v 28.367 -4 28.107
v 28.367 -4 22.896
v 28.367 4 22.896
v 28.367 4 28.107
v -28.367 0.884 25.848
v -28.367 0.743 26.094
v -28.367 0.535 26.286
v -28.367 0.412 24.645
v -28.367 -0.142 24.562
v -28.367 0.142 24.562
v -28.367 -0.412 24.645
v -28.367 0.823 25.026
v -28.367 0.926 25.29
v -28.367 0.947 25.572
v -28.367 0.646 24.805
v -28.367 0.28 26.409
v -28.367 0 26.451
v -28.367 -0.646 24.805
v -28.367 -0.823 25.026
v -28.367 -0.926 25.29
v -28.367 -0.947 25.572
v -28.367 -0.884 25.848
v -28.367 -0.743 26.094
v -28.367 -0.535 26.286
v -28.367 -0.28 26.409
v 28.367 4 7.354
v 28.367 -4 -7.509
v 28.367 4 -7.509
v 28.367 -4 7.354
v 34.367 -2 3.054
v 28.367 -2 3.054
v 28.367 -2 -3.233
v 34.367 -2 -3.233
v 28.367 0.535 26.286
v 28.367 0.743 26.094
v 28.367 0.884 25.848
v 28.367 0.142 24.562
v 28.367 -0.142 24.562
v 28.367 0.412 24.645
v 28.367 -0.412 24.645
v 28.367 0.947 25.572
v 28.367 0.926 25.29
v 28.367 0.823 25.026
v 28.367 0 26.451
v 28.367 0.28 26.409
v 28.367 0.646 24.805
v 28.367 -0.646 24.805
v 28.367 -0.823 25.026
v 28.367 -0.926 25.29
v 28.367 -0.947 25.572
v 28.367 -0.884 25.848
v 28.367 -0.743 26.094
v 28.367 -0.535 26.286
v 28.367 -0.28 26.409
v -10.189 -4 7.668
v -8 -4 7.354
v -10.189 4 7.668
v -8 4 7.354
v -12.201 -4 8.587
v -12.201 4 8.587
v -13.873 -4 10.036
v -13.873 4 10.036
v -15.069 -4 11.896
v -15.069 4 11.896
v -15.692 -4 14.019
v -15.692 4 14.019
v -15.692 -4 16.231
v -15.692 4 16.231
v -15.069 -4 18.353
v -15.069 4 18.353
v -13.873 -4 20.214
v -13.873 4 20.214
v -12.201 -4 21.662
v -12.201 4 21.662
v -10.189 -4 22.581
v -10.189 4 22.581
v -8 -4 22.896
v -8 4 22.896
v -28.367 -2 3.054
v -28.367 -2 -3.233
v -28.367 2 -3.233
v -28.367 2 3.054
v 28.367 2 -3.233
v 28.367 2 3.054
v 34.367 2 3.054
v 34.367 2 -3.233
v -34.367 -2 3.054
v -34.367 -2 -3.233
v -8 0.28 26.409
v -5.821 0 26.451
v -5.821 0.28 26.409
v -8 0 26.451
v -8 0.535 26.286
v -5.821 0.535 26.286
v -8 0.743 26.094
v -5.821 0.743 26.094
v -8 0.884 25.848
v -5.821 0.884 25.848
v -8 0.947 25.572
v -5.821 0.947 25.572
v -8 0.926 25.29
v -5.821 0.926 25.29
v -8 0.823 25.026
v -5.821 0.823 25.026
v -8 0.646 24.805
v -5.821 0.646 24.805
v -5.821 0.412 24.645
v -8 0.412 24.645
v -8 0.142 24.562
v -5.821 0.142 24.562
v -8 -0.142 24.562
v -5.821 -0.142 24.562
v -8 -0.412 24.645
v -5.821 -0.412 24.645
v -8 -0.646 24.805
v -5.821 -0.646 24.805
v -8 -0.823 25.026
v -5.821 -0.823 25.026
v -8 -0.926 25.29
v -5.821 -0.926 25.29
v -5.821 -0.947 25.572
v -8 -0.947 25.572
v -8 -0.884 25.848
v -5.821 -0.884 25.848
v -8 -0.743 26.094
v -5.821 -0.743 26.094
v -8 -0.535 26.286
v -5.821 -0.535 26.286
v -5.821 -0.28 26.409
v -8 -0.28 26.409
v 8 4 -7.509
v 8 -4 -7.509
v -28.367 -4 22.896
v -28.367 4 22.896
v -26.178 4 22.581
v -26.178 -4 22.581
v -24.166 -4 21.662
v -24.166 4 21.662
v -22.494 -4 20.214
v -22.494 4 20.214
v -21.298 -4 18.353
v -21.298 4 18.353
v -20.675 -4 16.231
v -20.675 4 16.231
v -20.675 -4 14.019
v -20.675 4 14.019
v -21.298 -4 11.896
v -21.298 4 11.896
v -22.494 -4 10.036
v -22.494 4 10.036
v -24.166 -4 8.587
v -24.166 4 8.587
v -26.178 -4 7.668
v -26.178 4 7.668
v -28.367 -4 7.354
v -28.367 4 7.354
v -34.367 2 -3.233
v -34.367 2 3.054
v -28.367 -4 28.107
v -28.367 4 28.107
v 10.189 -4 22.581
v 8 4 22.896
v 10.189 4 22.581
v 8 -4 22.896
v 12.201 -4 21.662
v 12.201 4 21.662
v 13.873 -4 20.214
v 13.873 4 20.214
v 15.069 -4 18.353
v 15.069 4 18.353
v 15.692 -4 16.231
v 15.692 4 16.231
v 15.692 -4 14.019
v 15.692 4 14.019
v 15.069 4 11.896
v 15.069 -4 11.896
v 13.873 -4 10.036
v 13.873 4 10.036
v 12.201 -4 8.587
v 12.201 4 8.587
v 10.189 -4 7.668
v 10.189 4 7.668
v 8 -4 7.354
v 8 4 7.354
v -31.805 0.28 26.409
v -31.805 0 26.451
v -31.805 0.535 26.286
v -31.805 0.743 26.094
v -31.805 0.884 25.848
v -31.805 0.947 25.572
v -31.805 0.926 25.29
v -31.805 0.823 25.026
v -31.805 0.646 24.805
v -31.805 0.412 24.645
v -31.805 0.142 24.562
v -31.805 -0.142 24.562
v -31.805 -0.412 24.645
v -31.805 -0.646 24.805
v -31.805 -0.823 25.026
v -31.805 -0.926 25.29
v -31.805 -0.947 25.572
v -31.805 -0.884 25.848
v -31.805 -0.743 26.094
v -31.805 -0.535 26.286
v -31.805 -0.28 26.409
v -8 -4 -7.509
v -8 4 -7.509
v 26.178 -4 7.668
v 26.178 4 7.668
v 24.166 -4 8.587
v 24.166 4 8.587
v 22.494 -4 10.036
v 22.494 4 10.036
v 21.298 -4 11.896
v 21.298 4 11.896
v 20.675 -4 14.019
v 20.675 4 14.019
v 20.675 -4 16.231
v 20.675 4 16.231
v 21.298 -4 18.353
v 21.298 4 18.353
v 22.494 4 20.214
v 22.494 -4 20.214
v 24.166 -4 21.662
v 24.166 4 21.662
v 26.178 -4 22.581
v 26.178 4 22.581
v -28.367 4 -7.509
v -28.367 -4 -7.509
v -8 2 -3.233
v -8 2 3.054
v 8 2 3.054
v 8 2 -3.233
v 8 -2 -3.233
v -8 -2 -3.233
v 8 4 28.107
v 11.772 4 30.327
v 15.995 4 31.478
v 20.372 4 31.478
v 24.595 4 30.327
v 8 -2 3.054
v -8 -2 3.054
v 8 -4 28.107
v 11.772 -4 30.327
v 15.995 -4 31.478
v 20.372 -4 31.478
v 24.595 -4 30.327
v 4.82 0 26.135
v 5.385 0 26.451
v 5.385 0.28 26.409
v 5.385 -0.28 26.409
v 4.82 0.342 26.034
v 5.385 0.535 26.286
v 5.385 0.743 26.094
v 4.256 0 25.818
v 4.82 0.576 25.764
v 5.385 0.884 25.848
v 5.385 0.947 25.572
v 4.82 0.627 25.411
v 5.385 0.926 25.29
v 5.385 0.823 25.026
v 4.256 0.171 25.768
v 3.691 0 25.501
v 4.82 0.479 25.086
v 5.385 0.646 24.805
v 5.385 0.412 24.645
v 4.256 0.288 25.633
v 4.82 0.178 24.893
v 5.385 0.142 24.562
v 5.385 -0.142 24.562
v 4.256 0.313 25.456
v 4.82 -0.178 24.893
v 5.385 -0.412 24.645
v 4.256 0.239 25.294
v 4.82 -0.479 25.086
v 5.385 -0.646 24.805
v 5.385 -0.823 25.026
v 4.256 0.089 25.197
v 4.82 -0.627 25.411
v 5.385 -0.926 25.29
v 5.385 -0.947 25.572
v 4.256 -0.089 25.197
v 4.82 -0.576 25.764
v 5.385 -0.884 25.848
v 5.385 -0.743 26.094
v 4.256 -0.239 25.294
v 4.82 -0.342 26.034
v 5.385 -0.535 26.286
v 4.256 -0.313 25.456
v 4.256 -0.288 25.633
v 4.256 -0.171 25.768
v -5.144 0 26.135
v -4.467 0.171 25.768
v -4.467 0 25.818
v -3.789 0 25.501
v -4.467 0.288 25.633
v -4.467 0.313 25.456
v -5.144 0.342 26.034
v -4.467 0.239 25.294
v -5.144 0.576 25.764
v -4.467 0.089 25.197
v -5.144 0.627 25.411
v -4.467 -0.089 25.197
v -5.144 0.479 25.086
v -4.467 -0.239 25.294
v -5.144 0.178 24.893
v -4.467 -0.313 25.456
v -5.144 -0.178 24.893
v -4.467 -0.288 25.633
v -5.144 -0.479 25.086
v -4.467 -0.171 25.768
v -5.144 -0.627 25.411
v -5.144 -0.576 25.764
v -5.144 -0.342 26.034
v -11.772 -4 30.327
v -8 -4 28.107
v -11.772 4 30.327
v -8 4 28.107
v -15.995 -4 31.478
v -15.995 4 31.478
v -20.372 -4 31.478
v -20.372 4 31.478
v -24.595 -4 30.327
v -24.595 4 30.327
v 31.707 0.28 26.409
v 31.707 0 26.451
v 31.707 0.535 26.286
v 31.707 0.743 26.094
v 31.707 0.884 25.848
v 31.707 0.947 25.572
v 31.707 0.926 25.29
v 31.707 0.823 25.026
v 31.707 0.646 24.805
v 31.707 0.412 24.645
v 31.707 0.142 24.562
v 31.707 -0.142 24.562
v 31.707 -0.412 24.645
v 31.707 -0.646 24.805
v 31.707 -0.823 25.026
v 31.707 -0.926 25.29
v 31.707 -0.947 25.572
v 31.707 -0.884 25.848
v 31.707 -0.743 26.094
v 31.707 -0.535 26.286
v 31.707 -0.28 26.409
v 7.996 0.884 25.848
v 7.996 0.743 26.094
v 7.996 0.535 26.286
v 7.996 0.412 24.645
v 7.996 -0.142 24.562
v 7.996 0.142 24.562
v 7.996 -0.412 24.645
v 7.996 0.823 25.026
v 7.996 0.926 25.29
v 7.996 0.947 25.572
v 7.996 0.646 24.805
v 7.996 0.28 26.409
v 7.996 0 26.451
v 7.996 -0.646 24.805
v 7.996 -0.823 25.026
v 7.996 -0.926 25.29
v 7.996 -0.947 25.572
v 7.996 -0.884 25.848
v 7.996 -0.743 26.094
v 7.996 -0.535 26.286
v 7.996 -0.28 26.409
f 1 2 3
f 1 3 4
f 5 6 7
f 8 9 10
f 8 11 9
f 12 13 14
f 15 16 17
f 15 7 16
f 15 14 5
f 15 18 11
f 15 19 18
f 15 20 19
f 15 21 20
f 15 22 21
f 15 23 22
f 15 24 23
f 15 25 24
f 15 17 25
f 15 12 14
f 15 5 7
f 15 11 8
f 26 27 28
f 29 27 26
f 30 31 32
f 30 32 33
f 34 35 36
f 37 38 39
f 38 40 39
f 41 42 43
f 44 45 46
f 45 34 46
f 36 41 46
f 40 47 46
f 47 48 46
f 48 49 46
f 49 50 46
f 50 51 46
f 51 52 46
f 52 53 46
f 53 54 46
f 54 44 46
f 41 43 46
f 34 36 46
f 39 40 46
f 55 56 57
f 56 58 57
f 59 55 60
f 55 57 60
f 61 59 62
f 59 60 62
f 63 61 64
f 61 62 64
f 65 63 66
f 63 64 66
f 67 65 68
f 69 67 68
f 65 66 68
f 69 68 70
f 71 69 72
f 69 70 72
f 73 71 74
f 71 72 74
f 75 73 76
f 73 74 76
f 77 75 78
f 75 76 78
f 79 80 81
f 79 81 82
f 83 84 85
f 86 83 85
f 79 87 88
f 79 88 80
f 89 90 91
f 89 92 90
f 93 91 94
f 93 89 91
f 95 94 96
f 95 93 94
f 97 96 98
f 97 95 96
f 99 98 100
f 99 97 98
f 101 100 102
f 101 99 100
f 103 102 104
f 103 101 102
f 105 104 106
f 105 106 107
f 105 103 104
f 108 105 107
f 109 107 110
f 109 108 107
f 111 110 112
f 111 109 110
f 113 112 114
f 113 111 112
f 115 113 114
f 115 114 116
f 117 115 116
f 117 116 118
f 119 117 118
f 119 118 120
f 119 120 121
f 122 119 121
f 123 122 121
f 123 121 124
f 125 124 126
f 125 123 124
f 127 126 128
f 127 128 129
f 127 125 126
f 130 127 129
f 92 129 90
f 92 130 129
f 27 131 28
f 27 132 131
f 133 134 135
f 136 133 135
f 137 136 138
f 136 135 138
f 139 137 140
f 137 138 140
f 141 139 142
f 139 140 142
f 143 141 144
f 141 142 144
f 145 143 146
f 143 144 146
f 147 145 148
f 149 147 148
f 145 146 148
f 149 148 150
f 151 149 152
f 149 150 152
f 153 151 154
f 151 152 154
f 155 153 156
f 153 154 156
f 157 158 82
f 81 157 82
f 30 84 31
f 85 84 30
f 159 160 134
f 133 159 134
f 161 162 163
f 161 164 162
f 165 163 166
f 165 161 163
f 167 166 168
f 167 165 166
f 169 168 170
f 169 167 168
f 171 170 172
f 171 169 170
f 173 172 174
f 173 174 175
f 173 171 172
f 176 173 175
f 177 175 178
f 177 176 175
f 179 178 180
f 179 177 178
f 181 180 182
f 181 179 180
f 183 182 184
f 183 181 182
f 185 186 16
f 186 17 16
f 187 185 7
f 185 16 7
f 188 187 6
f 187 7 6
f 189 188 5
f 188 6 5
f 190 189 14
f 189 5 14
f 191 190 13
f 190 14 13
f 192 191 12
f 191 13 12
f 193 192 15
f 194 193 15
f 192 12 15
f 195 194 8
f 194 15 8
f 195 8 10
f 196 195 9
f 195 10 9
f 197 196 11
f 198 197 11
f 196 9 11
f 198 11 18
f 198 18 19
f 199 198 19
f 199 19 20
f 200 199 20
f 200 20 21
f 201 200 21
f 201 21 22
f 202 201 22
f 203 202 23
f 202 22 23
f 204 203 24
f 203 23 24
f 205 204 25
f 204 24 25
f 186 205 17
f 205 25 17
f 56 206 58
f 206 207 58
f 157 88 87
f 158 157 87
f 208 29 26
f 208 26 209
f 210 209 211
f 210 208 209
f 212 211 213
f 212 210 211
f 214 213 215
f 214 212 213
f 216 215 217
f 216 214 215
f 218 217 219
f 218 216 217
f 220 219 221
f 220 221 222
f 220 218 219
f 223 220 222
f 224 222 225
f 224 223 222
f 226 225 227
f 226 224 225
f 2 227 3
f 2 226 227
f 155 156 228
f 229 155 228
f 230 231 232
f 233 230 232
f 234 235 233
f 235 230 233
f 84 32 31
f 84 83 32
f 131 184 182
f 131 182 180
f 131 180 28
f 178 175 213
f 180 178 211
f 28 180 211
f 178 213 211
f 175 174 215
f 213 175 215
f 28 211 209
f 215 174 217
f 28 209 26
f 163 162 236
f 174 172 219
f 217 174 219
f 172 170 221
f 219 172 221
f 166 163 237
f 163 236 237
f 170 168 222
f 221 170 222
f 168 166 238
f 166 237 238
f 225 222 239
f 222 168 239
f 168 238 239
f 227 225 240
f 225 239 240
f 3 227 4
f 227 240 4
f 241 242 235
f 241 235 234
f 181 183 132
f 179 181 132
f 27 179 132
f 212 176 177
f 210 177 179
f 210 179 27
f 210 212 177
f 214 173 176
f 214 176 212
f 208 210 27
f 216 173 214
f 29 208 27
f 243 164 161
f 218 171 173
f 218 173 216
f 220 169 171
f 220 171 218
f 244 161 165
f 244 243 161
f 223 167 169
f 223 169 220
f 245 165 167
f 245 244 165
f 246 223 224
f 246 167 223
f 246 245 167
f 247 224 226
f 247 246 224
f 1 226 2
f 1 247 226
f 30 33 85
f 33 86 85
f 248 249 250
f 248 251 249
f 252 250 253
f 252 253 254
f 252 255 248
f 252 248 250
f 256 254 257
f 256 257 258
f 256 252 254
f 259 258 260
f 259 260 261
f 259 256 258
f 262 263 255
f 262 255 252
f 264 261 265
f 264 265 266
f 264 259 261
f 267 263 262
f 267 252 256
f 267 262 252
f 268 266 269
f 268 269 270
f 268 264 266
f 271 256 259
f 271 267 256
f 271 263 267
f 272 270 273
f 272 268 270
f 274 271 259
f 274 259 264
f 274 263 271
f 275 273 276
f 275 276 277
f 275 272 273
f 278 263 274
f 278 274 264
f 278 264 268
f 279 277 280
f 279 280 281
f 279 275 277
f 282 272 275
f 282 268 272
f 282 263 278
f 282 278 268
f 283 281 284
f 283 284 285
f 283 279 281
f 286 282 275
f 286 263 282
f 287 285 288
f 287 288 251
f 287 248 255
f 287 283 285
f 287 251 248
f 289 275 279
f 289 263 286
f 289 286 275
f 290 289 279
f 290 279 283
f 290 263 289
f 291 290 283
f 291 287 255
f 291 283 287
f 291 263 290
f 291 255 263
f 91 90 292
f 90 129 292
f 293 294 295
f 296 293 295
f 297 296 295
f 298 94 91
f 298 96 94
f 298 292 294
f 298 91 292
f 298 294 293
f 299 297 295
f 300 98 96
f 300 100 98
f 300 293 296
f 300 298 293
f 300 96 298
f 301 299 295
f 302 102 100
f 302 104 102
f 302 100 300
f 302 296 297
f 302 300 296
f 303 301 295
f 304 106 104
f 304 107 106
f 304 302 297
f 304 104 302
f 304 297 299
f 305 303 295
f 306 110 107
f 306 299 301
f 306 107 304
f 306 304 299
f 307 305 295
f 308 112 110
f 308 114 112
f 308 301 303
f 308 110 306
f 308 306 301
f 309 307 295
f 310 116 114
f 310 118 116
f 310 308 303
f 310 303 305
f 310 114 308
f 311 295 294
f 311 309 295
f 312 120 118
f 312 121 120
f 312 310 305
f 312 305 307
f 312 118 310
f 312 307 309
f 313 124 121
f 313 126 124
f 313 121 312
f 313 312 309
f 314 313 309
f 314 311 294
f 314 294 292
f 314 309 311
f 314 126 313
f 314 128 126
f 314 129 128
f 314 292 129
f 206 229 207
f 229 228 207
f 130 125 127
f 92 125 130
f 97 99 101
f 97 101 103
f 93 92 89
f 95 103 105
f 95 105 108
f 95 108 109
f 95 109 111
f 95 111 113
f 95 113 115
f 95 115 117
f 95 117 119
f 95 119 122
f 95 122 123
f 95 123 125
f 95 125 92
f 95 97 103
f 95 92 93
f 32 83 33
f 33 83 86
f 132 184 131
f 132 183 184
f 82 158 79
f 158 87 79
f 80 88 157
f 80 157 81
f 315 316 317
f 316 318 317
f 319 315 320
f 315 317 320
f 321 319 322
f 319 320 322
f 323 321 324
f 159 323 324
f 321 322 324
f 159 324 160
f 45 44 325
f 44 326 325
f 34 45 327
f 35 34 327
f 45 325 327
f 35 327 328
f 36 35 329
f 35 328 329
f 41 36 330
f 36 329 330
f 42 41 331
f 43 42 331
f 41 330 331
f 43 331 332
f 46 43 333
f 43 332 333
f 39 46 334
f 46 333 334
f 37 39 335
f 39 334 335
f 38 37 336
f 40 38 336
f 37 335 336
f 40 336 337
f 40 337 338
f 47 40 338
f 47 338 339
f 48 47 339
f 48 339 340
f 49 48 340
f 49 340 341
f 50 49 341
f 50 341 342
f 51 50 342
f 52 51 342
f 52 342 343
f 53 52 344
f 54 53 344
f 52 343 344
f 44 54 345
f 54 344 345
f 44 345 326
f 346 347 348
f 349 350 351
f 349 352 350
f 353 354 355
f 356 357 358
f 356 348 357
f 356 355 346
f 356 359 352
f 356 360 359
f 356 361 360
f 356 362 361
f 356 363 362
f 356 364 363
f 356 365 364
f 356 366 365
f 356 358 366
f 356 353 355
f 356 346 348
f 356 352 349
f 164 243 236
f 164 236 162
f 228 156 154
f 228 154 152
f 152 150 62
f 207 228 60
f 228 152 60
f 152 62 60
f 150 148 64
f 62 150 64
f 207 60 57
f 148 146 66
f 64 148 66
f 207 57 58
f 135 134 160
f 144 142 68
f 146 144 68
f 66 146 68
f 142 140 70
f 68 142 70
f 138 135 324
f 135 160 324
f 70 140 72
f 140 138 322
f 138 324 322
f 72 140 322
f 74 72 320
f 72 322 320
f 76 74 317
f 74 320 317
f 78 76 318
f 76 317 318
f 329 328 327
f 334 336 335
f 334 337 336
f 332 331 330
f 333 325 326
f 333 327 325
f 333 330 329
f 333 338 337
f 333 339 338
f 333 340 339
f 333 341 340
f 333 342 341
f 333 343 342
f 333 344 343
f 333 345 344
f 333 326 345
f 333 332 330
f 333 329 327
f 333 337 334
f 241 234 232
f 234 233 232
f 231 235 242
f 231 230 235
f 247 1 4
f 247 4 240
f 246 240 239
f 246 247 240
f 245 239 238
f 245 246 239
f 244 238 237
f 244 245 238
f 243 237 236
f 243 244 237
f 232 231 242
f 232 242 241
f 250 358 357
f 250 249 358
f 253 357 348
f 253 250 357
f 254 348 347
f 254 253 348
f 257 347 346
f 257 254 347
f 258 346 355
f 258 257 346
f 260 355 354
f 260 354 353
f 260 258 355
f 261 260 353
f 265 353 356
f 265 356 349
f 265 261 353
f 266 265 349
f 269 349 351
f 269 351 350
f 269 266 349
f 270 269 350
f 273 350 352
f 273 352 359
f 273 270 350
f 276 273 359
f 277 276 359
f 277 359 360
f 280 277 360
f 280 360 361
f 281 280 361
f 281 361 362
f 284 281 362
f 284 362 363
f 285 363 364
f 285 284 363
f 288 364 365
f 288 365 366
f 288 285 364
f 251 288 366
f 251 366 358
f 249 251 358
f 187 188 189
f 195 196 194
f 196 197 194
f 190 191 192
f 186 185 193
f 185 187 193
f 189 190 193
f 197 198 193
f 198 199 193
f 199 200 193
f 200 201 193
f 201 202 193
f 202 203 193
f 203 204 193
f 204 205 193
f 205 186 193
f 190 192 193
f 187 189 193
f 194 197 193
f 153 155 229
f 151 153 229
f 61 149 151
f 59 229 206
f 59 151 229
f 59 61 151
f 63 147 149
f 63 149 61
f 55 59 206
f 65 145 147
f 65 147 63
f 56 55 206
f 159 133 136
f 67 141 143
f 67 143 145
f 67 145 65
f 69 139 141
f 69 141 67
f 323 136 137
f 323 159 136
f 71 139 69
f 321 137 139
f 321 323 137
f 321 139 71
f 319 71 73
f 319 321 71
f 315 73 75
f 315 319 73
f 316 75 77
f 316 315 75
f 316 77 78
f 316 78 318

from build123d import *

# Parameters (mm, degrees)
F1_DEPTH = 4
F0_W     = 6
F0_H     = 6.286999
F0_W_2   = 16
F2_DEPTH = 2
F0_W_3   = 3.438169
F0_H_2   = 0.950144
F0_W_4   = 3.340321


with BuildPart() as f1:
    # F0 (on Front) → F1 (new body, symmetric)
    with BuildSketch(Plane.XZ):
        with BuildLine():
            Line((-28.36689, 7.353563), (-28.36689, 3.053606))
            Line((-28.36689, 3.053606), (-28.36689, -3.233393))
            Line((-28.36689, -3.233393), (-28.36689, -7.508554))
            Line((-28.36689, -7.508554), (-8, -7.508554))
            Line((-8, -7.508554), (-8, -3.233393))
            Line((-8, -3.233393), (-8, 3.053606))
            Line((-8, 3.053606), (-8, 7.353563))
            ThreePointArc((-8, 7.353563), (-15.771084, 15.124647), (-8, 22.89573))
            Line((-8, 22.89573), (-8, 24.438746))
            Line((-8, 24.438746), (-8, 25.501197))
            Line((-8, 25.501197), (-8, 26.451341))
            Line((-8, 26.451341), (-8, 28.106664))
            ThreePointArc((-8, 28.106664), (-18.183445, 31.624202), (-28.36689, 28.106664))
            Line((-28.36689, 28.106664), (-28.36689, 26.451341))
            Line((-28.36689, 26.451341), (-28.36689, 25.501197))
            Line((-28.36689, 25.501197), (-28.36689, 24.438746))
            Line((-28.36689, 24.438746), (-28.36689, 22.89573))
            ThreePointArc((-28.36689, 22.89573), (-20.595807, 15.124647), (-28.36689, 7.353563))
        make_face()
        with BuildLine():
            Line((8, 3.053606), (8, -3.233393))
            Line((8, -3.233393), (8, -7.508554))
            Line((8, -7.508554), (28.36689, -7.508554))
            Line((28.36689, -7.508554), (28.36689, -3.233393))
            Line((28.36689, -3.233393), (28.36689, 3.053606))
            Line((28.36689, 3.053606), (28.36689, 7.353563))
            ThreePointArc((28.36689, 7.353563), (20.595807, 15.124647), (28.36689, 22.89573))
            Line((28.36689, 22.89573), (28.36689, 24.438746))
            Line((28.36689, 24.438746), (28.36689, 25.501197))
            Line((28.36689, 25.501197), (28.36689, 26.451341))
            Line((28.36689, 26.451341), (28.36689, 28.106664))
            ThreePointArc((28.36689, 28.106664), (18.183445, 31.624202), (8, 28.106664))
            Line((8, 28.106664), (8, 22.89573))
            ThreePointArc((8, 22.89573), (15.771084, 15.124647), (8, 7.353563))
            Line((8, 7.353563), (8, 3.053606))
        make_face()
    extrude(amount=F1_DEPTH, both=True)


with BuildPart() as f2:
    # F0 (on Front) → F2 (new body, symmetric)
    with BuildSketch(Plane.XZ):
        with Locations((31.36689, -0.089894)):
            Rectangle(F0_W, F0_H)
        with Locations((0, -0.089894)):
            Rectangle(F0_W_2, F0_H)
        with Locations((-31.36689, -0.089894)):
            Rectangle(F0_W, F0_H)
    extrude(amount=F2_DEPTH, both=True)


with BuildPart() as f3:
    # F0 (on Front) → F3 (revolve)
    with BuildSketch(Plane.XZ):
        Polygon((-5.821326, 26.451341), (-8, 26.451341), (-8, 25.501197), (-3.789089, 25.501197), align=None)
        with Locations((-30.085974, 25.976269)):
            Rectangle(F0_W_3, F0_H_2)
        Polygon((5.384906, 26.451341), (3.691245, 25.501197), (7.995964, 25.501197), (7.995964, 26.451341), align=None)
        with Locations((30.03705, 25.976269)):
            Rectangle(F0_W_4, F0_H_2)
    revolve(axis=Axis((-5.894544, 0, 25.501197), (-1, 0, 0)))


solid = Compound([f1.part, f2.part, f3.part])
